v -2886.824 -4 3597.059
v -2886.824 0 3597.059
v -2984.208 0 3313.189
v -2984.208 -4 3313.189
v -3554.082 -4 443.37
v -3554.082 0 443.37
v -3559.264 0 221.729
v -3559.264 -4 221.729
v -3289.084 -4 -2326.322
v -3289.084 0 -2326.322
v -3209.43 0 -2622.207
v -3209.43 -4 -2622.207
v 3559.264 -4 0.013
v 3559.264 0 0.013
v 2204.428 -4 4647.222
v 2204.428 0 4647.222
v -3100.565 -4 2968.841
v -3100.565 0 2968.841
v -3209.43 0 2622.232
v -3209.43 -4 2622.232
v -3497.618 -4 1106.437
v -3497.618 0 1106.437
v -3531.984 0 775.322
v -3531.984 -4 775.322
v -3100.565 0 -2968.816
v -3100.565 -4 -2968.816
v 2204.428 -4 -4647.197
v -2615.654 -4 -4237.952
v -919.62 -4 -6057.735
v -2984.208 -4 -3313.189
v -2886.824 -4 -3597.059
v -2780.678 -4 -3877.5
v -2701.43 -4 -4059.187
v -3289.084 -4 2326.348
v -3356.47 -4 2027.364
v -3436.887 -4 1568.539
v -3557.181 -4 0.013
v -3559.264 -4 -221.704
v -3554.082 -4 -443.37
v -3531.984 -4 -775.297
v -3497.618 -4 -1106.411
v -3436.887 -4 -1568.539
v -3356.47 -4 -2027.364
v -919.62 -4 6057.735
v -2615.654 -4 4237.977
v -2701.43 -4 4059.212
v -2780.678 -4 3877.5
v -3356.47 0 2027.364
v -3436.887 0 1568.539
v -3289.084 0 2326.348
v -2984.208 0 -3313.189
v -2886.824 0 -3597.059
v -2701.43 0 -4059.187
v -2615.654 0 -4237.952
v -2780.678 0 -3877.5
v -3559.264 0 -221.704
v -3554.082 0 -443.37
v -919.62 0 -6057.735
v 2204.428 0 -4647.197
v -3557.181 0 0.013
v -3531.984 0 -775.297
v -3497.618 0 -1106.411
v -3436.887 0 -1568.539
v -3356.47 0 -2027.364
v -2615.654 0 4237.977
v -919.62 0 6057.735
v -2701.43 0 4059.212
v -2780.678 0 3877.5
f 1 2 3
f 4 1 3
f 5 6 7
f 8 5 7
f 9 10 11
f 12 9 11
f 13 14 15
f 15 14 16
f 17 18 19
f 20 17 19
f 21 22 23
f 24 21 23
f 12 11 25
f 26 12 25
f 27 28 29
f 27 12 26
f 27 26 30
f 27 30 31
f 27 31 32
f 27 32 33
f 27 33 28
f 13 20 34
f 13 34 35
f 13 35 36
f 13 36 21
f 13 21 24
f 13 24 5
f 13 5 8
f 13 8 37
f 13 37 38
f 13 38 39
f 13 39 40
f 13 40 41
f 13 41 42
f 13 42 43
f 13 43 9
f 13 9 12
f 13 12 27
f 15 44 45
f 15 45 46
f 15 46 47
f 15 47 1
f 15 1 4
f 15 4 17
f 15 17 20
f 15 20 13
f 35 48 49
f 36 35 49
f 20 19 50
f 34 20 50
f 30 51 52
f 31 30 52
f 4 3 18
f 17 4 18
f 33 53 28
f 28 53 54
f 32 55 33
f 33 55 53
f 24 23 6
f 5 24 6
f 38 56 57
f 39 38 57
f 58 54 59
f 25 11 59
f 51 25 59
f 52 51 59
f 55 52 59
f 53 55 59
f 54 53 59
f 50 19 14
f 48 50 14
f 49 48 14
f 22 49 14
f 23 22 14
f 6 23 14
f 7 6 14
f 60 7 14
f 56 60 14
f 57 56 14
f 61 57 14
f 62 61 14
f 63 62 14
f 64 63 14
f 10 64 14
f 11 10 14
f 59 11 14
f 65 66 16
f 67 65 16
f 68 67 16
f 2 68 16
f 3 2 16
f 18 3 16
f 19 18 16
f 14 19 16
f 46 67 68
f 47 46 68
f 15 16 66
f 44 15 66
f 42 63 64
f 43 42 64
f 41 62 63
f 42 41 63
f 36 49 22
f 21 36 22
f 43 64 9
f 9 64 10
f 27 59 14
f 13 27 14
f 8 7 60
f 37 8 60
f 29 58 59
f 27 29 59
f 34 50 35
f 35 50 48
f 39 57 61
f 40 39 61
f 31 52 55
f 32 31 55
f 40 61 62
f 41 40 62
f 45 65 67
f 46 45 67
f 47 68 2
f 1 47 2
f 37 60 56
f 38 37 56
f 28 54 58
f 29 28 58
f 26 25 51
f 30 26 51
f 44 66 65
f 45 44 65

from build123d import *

# Parameters (mm, degrees)
F1_DEPTH = 4


with BuildPart() as f1:
    # F0 (on Front) → F1 (new body)
    with BuildSketch(Plane.XZ):
        Polygon((-2615.6539, -4237.9519), (-919.6197, -6057.7349), (2204.4279, -4647.1967), (3559.2639, 0.0127), (2204.4279, 4647.2221), (-919.6197, 6057.7349), (-2615.6539, 4237.9773), (-2701.4297, 4059.2121), (-2780.6777, 3877.5005), (-2886.8243, 3597.0591), (-2984.2079, 3313.1887), (-3100.5653, 2968.8409), (-3209.4297, 2622.2325), (-3289.0841, 2326.3479), (-3356.4703, 2027.3645), (-3436.8867, 1568.5389), (-3497.6181, 1106.4367), (-3531.9843, 775.3223), (-3554.0823, 443.3697), (-3559.2639, 221.7293), (-3557.1811, 0.0127), (-3559.2639, -221.7039), (-3554.0823, -443.3697), (-3531.9843, -775.2969), (-3497.6181, -1106.4113), (-3436.8867, -1568.5389), (-3356.4703, -2027.3645), (-3289.0841, -2326.3225), (-3209.4297, -2622.2071), (-3100.5653, -2968.8155), (-2984.2079, -3313.1887), (-2886.8243, -3597.0591), (-2780.6777, -3877.5005), (-2701.4297, -4059.1867), align=None)
    extrude(amount=F1_DEPTH)


solid = f1.part
